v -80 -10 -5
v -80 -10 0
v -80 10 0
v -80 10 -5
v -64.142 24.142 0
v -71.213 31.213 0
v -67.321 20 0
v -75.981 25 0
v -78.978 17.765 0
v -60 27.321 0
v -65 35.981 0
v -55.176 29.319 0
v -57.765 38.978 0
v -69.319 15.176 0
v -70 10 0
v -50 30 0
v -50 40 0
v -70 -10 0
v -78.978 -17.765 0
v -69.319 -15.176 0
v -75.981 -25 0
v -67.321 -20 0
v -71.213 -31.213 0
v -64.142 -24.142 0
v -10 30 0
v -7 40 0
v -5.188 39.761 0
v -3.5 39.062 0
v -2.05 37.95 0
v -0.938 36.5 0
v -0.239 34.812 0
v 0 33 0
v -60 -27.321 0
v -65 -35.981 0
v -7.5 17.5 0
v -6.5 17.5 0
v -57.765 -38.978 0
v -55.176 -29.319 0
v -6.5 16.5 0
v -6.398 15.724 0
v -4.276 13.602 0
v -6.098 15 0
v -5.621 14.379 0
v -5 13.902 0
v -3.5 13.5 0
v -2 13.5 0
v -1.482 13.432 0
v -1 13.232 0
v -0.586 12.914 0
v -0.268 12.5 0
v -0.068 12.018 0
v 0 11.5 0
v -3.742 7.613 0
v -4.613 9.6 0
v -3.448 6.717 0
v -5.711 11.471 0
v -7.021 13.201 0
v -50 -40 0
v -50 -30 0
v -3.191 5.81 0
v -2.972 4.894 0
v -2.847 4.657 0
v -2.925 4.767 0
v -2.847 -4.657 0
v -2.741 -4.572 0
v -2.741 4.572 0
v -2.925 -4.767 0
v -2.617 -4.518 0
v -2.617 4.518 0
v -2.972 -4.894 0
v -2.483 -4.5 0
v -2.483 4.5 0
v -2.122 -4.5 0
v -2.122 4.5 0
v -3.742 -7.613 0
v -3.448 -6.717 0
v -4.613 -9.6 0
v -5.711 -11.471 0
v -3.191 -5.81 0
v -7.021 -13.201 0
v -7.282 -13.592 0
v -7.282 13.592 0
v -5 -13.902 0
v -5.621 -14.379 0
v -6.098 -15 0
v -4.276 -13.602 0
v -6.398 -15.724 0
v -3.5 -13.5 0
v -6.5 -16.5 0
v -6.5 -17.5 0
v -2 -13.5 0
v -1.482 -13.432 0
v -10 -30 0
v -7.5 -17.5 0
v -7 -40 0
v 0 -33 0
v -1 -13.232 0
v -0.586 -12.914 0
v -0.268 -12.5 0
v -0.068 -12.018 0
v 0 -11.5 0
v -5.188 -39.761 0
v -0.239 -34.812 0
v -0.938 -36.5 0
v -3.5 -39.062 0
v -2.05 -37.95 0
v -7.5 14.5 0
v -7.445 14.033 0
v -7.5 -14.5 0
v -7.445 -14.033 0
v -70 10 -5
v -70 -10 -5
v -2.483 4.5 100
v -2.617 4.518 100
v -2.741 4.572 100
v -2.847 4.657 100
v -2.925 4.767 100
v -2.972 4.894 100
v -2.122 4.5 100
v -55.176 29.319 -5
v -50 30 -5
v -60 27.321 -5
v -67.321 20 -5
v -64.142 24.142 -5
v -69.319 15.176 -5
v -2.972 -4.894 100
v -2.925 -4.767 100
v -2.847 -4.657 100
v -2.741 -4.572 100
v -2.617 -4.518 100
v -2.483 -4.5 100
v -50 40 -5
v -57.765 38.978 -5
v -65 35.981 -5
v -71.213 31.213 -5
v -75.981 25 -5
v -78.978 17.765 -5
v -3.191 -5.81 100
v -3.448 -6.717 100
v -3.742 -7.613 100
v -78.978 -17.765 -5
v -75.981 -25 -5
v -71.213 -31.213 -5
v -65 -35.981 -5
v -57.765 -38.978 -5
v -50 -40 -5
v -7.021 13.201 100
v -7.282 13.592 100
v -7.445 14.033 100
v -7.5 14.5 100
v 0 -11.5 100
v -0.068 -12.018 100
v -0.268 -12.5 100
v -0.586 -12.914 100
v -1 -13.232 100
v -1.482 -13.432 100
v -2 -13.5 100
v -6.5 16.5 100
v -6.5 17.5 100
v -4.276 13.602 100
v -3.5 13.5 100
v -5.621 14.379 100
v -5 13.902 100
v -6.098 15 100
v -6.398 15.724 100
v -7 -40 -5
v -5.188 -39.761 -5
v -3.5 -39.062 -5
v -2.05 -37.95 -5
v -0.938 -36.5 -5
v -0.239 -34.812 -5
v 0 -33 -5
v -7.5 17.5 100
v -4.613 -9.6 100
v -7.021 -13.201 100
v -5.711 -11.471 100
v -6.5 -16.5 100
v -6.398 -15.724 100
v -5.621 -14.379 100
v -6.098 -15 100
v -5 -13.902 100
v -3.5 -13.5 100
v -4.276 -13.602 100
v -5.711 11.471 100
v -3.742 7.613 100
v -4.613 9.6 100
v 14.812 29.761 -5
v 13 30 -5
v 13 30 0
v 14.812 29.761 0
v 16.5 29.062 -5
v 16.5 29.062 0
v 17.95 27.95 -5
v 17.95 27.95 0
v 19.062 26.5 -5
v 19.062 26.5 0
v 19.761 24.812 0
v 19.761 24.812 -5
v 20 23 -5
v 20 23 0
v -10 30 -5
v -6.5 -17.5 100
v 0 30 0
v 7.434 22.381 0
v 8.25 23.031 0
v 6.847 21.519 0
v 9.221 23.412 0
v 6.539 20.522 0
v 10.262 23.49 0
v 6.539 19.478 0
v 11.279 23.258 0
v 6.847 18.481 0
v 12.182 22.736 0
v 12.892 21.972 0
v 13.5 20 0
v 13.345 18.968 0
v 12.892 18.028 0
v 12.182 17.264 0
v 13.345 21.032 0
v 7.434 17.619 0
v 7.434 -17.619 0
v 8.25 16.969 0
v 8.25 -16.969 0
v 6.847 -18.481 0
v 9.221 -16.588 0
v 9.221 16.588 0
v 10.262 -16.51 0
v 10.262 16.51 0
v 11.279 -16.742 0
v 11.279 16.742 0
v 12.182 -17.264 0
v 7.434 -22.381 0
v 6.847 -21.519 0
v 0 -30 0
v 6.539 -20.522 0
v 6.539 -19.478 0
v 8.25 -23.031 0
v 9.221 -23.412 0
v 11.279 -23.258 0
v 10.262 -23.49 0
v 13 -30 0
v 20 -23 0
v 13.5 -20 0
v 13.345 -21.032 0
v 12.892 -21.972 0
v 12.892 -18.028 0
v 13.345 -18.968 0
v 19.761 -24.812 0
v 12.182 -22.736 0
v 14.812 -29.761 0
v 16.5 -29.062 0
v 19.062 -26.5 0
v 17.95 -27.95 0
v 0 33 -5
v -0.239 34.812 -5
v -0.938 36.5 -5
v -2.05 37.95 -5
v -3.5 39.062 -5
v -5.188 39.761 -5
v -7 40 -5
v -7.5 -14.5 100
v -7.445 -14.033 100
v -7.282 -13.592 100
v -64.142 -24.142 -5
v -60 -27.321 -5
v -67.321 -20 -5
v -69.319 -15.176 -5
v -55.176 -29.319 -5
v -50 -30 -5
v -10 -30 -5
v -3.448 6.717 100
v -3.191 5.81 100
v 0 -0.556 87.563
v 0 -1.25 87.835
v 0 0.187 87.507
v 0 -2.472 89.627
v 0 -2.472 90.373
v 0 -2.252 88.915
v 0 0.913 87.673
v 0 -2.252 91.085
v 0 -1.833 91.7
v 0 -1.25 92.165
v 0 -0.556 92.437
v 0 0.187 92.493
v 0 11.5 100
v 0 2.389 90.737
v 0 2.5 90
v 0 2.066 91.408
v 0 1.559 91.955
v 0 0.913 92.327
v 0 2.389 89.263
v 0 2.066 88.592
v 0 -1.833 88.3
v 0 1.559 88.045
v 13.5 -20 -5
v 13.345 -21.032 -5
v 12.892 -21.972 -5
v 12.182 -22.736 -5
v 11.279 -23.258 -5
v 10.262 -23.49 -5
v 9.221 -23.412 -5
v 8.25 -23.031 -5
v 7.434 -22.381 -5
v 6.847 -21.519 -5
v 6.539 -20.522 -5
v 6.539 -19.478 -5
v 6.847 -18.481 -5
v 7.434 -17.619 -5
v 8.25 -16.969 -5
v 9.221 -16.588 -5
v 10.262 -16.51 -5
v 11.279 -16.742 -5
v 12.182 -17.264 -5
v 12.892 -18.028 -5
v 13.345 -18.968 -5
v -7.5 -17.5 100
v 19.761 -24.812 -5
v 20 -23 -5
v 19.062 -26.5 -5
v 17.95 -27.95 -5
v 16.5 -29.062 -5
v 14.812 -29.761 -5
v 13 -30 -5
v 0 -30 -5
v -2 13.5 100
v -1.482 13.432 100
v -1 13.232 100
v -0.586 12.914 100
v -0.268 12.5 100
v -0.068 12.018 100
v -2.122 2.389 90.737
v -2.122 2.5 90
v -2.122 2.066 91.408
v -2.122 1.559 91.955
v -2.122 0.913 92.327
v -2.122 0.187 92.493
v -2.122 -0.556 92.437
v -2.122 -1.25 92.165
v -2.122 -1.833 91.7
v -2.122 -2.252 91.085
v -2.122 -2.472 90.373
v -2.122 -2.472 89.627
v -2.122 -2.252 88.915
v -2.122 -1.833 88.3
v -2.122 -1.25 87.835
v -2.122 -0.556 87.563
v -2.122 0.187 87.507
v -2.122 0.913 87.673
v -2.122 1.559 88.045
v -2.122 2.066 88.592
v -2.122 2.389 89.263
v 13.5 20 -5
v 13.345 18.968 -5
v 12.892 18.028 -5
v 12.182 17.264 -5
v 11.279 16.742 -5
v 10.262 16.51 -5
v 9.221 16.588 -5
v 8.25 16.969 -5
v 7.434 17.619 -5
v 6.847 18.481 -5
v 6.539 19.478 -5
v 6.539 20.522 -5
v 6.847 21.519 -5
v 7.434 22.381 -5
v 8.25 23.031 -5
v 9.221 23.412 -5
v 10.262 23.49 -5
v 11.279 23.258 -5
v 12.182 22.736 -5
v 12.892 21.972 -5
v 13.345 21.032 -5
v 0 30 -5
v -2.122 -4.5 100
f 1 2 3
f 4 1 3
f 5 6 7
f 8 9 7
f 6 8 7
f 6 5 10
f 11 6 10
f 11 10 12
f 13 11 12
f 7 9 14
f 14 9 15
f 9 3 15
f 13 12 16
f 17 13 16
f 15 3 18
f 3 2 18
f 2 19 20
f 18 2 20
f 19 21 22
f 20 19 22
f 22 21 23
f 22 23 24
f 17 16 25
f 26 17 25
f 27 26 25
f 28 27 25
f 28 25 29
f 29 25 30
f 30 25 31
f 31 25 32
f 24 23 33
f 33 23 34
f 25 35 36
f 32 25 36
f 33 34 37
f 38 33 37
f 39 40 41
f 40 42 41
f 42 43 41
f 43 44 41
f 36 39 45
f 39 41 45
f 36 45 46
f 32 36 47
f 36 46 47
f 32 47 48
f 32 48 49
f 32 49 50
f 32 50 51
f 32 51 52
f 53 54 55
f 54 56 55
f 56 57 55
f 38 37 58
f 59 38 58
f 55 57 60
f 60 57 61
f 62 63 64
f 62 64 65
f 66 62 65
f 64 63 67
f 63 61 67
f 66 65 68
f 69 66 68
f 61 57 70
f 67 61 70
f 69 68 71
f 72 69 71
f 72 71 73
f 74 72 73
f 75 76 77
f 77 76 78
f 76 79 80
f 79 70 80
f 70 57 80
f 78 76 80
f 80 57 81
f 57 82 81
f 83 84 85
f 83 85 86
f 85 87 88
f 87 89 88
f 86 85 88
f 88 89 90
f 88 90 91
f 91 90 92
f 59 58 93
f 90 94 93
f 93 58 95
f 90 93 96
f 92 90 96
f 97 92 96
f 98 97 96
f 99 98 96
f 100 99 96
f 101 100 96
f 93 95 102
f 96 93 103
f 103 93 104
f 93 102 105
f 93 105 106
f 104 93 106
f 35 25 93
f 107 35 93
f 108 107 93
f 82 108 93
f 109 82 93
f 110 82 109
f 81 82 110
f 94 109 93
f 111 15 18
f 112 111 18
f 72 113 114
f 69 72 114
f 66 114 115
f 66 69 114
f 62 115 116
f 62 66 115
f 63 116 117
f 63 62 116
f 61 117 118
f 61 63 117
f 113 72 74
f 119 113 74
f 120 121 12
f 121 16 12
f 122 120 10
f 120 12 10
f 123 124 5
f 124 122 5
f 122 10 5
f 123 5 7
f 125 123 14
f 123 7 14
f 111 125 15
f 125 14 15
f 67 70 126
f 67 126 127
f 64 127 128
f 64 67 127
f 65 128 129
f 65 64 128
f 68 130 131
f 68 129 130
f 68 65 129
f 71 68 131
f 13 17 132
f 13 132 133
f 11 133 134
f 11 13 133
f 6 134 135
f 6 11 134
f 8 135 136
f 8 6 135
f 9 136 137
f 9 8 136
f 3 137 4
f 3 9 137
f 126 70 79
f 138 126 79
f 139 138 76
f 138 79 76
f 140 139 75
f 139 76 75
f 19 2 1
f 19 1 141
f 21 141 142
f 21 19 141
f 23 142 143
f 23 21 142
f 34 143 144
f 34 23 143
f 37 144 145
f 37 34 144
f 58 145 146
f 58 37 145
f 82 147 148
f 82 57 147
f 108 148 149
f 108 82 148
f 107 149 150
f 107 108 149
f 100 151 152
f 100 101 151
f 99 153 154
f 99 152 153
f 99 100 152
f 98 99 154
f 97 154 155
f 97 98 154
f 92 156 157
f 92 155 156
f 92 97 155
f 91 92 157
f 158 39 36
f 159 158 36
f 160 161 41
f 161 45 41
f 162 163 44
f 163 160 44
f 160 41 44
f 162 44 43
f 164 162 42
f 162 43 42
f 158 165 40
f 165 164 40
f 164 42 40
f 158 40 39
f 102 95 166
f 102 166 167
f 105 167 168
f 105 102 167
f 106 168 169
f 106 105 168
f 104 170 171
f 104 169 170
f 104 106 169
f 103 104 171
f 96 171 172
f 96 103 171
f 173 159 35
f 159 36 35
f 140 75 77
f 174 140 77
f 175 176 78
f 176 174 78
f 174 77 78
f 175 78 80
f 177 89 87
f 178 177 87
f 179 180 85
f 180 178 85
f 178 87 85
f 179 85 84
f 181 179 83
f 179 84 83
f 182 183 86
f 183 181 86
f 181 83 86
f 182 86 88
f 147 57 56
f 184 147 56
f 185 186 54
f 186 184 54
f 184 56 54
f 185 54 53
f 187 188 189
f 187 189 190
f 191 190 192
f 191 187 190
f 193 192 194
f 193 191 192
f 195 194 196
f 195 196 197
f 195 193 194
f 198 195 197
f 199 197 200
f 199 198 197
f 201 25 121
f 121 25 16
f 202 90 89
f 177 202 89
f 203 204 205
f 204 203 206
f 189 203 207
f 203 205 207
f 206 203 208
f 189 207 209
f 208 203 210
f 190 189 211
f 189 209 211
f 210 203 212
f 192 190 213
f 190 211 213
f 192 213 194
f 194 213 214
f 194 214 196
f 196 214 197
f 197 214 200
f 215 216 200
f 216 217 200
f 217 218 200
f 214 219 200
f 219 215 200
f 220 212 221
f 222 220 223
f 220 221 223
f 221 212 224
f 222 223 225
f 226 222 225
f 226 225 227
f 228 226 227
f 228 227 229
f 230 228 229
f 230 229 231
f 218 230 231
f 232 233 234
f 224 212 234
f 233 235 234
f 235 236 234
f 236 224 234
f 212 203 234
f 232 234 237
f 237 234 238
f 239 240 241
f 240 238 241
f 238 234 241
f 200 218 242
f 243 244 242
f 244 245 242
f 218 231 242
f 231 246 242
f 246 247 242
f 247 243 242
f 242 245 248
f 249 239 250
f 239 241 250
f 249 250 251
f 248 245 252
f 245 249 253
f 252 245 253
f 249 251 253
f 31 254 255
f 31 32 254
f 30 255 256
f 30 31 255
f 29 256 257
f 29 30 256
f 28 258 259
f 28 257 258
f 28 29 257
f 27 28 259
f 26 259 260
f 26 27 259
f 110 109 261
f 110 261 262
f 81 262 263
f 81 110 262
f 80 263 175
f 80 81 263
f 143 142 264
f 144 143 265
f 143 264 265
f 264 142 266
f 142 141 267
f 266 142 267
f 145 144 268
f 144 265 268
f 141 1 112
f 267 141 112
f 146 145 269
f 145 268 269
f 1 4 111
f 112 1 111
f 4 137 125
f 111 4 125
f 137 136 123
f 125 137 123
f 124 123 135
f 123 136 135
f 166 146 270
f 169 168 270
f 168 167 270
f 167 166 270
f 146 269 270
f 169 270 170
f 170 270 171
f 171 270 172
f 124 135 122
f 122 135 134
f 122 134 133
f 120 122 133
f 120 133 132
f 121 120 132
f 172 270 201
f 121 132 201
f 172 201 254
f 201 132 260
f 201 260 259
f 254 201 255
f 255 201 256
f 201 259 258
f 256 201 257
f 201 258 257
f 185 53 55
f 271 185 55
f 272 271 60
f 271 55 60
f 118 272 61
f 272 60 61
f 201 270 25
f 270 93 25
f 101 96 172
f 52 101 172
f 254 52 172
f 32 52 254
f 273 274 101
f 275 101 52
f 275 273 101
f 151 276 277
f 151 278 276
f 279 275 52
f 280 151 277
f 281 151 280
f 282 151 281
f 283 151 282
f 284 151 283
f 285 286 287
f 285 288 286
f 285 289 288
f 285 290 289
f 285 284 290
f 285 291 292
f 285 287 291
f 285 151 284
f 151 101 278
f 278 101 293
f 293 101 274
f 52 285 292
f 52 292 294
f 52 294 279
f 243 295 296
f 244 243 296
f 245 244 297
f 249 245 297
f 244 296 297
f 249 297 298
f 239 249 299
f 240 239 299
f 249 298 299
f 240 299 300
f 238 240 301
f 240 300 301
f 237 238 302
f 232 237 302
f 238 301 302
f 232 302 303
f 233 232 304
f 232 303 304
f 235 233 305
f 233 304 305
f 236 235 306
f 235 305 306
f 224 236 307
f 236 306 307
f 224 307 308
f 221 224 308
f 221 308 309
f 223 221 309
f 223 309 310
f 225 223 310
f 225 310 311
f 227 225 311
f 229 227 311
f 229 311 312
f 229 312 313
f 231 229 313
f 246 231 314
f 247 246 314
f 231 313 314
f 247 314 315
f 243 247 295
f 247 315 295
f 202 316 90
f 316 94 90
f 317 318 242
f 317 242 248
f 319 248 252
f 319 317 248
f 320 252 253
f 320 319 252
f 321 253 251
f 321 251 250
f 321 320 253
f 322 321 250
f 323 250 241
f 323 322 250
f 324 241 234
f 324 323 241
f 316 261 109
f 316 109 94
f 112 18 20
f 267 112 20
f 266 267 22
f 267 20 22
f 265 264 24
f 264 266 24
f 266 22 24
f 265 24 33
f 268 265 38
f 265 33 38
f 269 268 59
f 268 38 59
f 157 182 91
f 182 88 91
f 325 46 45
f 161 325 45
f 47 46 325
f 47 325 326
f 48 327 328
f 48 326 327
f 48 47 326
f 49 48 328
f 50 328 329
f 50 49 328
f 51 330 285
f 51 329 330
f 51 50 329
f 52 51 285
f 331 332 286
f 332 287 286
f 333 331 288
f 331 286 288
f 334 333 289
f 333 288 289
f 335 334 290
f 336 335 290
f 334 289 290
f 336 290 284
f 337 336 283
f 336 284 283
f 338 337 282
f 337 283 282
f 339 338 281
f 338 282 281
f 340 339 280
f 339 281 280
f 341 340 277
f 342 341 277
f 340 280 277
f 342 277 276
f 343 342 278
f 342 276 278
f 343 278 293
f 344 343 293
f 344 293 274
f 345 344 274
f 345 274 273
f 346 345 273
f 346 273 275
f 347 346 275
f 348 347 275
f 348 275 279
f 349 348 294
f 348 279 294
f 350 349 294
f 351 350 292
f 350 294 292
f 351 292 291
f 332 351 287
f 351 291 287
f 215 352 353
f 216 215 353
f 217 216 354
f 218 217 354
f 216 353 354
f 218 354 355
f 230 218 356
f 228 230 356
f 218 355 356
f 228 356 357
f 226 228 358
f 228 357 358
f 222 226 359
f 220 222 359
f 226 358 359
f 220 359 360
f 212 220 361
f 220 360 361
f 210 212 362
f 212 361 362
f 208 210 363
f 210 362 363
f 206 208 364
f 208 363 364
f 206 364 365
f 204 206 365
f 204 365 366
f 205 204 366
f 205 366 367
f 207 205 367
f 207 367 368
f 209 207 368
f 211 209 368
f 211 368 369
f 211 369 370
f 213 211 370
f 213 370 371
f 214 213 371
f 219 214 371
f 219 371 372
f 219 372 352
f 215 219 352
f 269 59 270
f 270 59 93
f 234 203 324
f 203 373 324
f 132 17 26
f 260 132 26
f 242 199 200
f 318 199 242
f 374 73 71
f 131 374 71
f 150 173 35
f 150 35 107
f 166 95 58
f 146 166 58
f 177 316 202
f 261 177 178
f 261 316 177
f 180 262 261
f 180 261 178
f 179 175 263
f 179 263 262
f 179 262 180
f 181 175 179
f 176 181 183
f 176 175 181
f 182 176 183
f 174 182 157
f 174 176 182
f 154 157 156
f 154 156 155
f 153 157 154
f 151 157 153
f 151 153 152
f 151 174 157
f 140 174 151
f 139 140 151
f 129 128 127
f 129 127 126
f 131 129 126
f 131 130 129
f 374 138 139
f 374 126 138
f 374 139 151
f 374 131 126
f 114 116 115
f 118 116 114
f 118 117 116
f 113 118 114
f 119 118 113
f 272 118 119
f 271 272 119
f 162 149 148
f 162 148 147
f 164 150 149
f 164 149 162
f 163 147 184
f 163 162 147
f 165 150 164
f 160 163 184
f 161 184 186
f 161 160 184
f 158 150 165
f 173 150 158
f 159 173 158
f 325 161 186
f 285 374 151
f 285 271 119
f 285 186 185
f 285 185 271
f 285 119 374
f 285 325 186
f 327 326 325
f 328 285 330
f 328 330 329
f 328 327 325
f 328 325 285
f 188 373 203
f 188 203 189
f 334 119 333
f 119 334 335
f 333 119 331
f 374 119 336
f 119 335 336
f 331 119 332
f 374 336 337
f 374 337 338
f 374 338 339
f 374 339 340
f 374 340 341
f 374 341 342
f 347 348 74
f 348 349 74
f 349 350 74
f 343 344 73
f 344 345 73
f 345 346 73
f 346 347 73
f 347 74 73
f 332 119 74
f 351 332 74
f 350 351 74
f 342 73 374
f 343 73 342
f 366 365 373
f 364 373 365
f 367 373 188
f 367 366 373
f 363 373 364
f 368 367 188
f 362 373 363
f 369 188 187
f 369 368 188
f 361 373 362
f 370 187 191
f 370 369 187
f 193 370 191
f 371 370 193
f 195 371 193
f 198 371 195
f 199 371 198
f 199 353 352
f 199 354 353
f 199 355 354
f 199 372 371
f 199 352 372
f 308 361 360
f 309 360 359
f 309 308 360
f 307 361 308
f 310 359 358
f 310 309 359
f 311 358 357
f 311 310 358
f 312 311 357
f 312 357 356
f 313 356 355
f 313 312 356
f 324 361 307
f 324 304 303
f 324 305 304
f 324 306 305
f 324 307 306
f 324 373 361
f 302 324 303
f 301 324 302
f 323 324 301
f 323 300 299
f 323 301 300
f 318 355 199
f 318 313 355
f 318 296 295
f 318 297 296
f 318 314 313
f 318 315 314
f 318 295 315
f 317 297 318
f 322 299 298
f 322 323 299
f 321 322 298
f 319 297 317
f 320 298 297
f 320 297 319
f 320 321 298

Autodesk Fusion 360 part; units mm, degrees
sketch "Sketch1" plane through (0, 0, 0) normal (0, 0, 1) x (1, 0, 0)
  line L0 (0, -11.5) -> (0, 11.5)
  line L1 (-6.5, 17.5) -> (-7.5, 17.5)
  arc A0 (-2.9716, 4.8936) -> (-2.4831, 4.5) centre (-2.4831, 5) ccw
  arc A1 (-7.5, 14.5) -> (-7.021, 13.2013) centre (-5.5, 14.5) ccw
  line L2 (-7.5, -14.5) -> (-7.5, -17.5)
  arc A2 (-6.5, 16.5) -> (-3.5, 13.5) centre (-3.5, 16.5) ccw
  arc A3 (-3.7416, -7.6132) -> (-3.6837, -7.4547) centre (-21.0901, -1.1884) ccw
  arc A4 (-3.7416, 7.6132) -> (-3.8046, 7.7905) centre (-25.445, 0) ccw
  line L3 (-3.6837, -7.4547) -> (-3.8046, -7.7905)
  arc A5 (-3.7416, 7.6132) -> (-7.021, 13.2013) centre (-21.0901, 1.1884) ccw
  arc A6 (-3.7416, -7.6132) -> (-2.9716, -4.8936) centre (-25.445, 0) ccw
  arc A7 (-2, -13.5) -> (0, -11.5) centre (-2, -11.5) ccw
  line L4 (-7.5, -17.5) -> (-6.5, -17.5)
  line L5 (-2.1215, -4.5) -> (-2.4831, -4.5)
  arc A8 (0, 11.5) -> (-2, 13.5) centre (-2, 11.5) ccw
  arc A9 (-3.5, -13.5) -> (-6.5, -16.5) centre (-3.5, -16.5) ccw
  line L6 (-3.5, -13.5) -> (-2, -13.5)
  line L7 (-2, 13.5) -> (-3.5, 13.5)
  line L8 (-7.5, 17.5) -> (-7.5, 14.5)
  line L9 (-6.5, -17.5) -> (-6.5, -16.5)
  line L10 (-2.4831, 4.5) -> (-2.1215, 4.5)
  arc A10 (-7.021, -13.2013) -> (-3.7416, -7.6132) centre (-21.0901, -1.1884) ccw
  arc A11 (-7.021, -13.2013) -> (-7.5, -14.5) centre (-5.5, -14.5) ccw
  line L11 (-3.8046, 7.7905) -> (-3.6837, 7.4547)
  line L12 (-6.5, 16.5) -> (-6.5, 17.5)
  arc A12 (-3.8046, -7.7905) -> (-3.7416, -7.6132) centre (-25.445, 0) ccw
  arc A13 (-3.6837, 7.4547) -> (-3.7416, 7.6132) centre (-21.0901, 1.1884) ccw
  line L13 (-2.1215, 4.5) -> (-2.1215, -4.5)
  arc A14 (-2.9716, 4.8936) -> (-3.7416, 7.6132) centre (-25.445, 0) ccw
  arc A15 (-2.4831, -4.5) -> (-2.9716, -4.8936) centre (-2.4831, -5) ccw
extrude "Extrude1" add sketch "Sketch1" along normal blind 100 makes body 1
sketch "Sketch3" plane through (0, 0, 0) normal (0, 0, -1) x (1, 0, 0)
  line L0 (-6.5, -17.5) -> (-6.5, -16.5)
  arc A0 (-3.5, -13.5) -> (-6.5, -16.5) centre (-3.5, -16.5) ccw
  line L1 (-3.5, -13.5) -> (-2, -13.5)
  arc A1 (-2, -13.5) -> (0, -11.5) centre (-2, -11.5) ccw
  line L2 (0, -11.5) -> (0, 11.5)
  arc A2 (0, 11.5) -> (-2, 13.5) centre (-2, 11.5) ccw
  line L3 (-2, 13.5) -> (-3.5, 13.5)
  arc A3 (-6.5, 16.5) -> (-3.5, 13.5) centre (-3.5, 16.5) ccw
  line L4 (-6.5, 16.5) -> (-6.5, 17.5)
  line L5 (-6.5, 17.5) -> (-7.5, 17.5)
  line L6 (-7.5, 17.5) -> (-7.5, 14.5)
  arc A4 (-7.5, 14.5) -> (-7.021, 13.2013) centre (-5.5, 14.5) ccw
  arc A5 (-3.7416, 7.6132) -> (-7.021, 13.2013) centre (-21.0901, 1.1884) ccw
  arc A6 (-3.7416, 7.6132) -> (-3.8046, 7.7905) centre (-25.445, 0) ccw
  line L7 (-3.8046, 7.7905) -> (-3.6837, 7.4547)
  arc A7 (-3.6837, 7.4547) -> (-3.7416, 7.6132) centre (-21.0901, 1.1884) ccw
  arc A8 (-2.9716, 4.8936) -> (-3.7416, 7.6132) centre (-25.445, 0) ccw
  arc A9 (-2.9716, 4.8936) -> (-2.4831, 4.5) centre (-2.4831, 5) ccw
  line L8 (-2.4831, 4.5) -> (-2.1215, 4.5)
  line L9 (-2.1215, 4.5) -> (-2.1215, -4.5)
  line L10 (-2.1215, -4.5) -> (-2.4831, -4.5)
  arc A10 (-2.4831, -4.5) -> (-2.9716, -4.8936) centre (-2.4831, -5) ccw
  arc A11 (-3.7416, -7.6132) -> (-2.9716, -4.8936) centre (-25.445, 0) ccw
  arc A12 (-3.7416, -7.6132) -> (-3.6837, -7.4547) centre (-21.0901, -1.1884) ccw
  line L11 (-3.6837, -7.4547) -> (-3.8046, -7.7905)
  arc A13 (-3.8046, -7.7905) -> (-3.7416, -7.6132) centre (-25.445, 0) ccw
  arc A14 (-7.021, -13.2013) -> (-3.7416, -7.6132) centre (-21.0901, -1.1884) ccw
  arc A15 (-7.021, -13.2013) -> (-7.5, -14.5) centre (-5.5, -14.5) ccw
  line L12 (-7.5, -14.5) -> (-7.5, -17.5)
  line L13 (-7.5, -17.5) -> (-6.5, -17.5)
  line L14 (-7, 40) -> (-50, 40)
  line L15 (-80, 10) -> (-80, -10)
  line L16 (-50, -40) -> (-7, -40)
  line L17 (0, -33) -> (0, 33)
  line L18 (0, 25.5) -> (0, -25.5)
  line L19 (-10, -30) -> (-50, -30)
  line L20 (-70, -10) -> (-70, 10)
  line L21 (-50, 30) -> (-10, 30)
  line L22 (-10, 30) -> (-10, -30)
  arc A16 (-70, -10) -> (-50, -30) centre (-50, -10) ccw
  arc A17 (-50, 30) -> (-70, 10) centre (-50, 10) ccw
  arc A18 (-80, -10) -> (-50, -40) centre (-50, -10) ccw
  arc A19 (-50, 40) -> (-80, 10) centre (-50, 10) ccw
  arc A20 (-7, -40) -> (0, -33) centre (-7, -33) ccw
  arc A21 (0, 33) -> (-7, 40) centre (-7, 33) ccw
  point P0 (0, 40)
  point P1 (-80, 40)
  point P2 (0, -40)
  point P3 (-70, -30)
  dimension "d14" = 80
  dimension "d15" = 80
  dimension "d16" = 60
  dimension "d17" = 60
  dimension "d18" = 10
  dimension "d19" = 10
  dimension "d20" = 20
  dimension "d21" = 30
  dimension "d22" = 7
extrude "Extrude3" add sketch "Sketch3" along normal blind 5 contours L0 A0 L1 A1 A2 L3 A3 L4 L5 L6 A4 A5 A8 A9 L8 L9 L10 A10 A11 A14 A15 L12 L13 L14 L15 L16 L17 L18 A18 A19 A20 A21 bodies 1
extrude "Extrude4" add 1 faces at (-0.7072, 1.5, 0) along direction (0, 0, -1) blind 5 on bodies 1 bodies 1
sketch "Sketch4" plane through (0, 0, 0) normal (1, 0, 0) x (0, 1, 0)
  line L0 (-11.5, 0) -> (-33, 0)
  line L1 (11.5, 0) -> (11.5, 100)
  line L2 (11.5, 100) -> (-11.5, 100)
  line L3 (-11.5, 100) -> (-11.5, 0)
  circle A0 centre (0, 90) radius 2.5
  line L4 (-33, 0) -> (-33, -5)
  line L5 (-33, -5) -> (33, -5)
  line L6 (33, -5) -> (33, 0)
  line L7 (33, 0) -> (11.5, 0)
  dimension "d27" = 5
  dimension "d28" = 10
extrude "Extrude5" cut sketch "Sketch4" against normal blind 5 contours A0 bodies 1
sketch "Sketch5" plane through (0, 0, -5) normal (0, 0, -1) x (1, 0, 0)
  arc A0 (-3.7416, 7.6132) -> (-3.8046, 7.7905) centre (-25.445, 0) ccw
  line L0 (-3.8046, 7.7905) -> (-3.6837, 7.4547)
  arc A1 (-3.6837, 7.4547) -> (-3.7416, 7.6132) centre (-21.0901, 1.1884) ccw
  line L1 (0, -33) -> (0, 33)
  arc A2 (0, 33) -> (-7, 40) centre (-7, 33) ccw
  line L2 (-7, 40) -> (-50, 40)
  arc A3 (-50, 40) -> (-80, 10) centre (-50, 10) ccw
  line L3 (-80, 10) -> (-80, -10)
  arc A4 (-80, -10) -> (-50, -40) centre (-50, -10) ccw
  line L4 (-50, -40) -> (-7, -40)
  arc A5 (-7, -40) -> (0, -33) centre (-7, -33) ccw
  line L5 (-50, 30) -> (-10, 30)
  line L6 (-10, 30) -> (-10, -30)
  line L7 (-10, -30) -> (-50, -30)
  arc A6 (-70, -10) -> (-50, -30) centre (-50, -10) ccw
  line L8 (-70, -10) -> (-70, 10)
  arc A7 (-50, 30) -> (-70, 10) centre (-50, 10) ccw
  arc A8 (-3.7416, -7.6132) -> (-3.6837, -7.4547) centre (-21.0901, -1.1884) ccw
  line L9 (-3.6837, -7.4547) -> (-3.8046, -7.7905)
  arc A9 (-3.8046, -7.7905) -> (-3.7416, -7.6132) centre (-25.445, 0) ccw
  line L10 (0, -30) -> (13, -30)
  line L11 (20, -23) -> (20, 23)
  line L12 (13, 30) -> (0, 30)
  line L13 (0, 30) -> (0, -30)
  circle A10 centre (10, -20) radius 3.5
  circle A11 centre (10, 20) radius 3.5
  arc A12 (13, -30) -> (20, -23) centre (13, -23) ccw
  arc A13 (20, 23) -> (13, 30) centre (13, 23) ccw
  point P0 (20, -30)
  dimension "d31" = 20
  dimension "d32" = 60
  dimension "d33" = 10
  dimension "d34" = 7
  dimension "d35" = 7
  dimension "d36" = 40
  dimension "d37" = 10
  dimension "d38" = 10
  dimension "d39" = 7
extrude "Extrude6" add sketch "Sketch5" against normal blind 5 separate body contours L1 L10 L11 L12 L13 A12 A13 makes body 2
